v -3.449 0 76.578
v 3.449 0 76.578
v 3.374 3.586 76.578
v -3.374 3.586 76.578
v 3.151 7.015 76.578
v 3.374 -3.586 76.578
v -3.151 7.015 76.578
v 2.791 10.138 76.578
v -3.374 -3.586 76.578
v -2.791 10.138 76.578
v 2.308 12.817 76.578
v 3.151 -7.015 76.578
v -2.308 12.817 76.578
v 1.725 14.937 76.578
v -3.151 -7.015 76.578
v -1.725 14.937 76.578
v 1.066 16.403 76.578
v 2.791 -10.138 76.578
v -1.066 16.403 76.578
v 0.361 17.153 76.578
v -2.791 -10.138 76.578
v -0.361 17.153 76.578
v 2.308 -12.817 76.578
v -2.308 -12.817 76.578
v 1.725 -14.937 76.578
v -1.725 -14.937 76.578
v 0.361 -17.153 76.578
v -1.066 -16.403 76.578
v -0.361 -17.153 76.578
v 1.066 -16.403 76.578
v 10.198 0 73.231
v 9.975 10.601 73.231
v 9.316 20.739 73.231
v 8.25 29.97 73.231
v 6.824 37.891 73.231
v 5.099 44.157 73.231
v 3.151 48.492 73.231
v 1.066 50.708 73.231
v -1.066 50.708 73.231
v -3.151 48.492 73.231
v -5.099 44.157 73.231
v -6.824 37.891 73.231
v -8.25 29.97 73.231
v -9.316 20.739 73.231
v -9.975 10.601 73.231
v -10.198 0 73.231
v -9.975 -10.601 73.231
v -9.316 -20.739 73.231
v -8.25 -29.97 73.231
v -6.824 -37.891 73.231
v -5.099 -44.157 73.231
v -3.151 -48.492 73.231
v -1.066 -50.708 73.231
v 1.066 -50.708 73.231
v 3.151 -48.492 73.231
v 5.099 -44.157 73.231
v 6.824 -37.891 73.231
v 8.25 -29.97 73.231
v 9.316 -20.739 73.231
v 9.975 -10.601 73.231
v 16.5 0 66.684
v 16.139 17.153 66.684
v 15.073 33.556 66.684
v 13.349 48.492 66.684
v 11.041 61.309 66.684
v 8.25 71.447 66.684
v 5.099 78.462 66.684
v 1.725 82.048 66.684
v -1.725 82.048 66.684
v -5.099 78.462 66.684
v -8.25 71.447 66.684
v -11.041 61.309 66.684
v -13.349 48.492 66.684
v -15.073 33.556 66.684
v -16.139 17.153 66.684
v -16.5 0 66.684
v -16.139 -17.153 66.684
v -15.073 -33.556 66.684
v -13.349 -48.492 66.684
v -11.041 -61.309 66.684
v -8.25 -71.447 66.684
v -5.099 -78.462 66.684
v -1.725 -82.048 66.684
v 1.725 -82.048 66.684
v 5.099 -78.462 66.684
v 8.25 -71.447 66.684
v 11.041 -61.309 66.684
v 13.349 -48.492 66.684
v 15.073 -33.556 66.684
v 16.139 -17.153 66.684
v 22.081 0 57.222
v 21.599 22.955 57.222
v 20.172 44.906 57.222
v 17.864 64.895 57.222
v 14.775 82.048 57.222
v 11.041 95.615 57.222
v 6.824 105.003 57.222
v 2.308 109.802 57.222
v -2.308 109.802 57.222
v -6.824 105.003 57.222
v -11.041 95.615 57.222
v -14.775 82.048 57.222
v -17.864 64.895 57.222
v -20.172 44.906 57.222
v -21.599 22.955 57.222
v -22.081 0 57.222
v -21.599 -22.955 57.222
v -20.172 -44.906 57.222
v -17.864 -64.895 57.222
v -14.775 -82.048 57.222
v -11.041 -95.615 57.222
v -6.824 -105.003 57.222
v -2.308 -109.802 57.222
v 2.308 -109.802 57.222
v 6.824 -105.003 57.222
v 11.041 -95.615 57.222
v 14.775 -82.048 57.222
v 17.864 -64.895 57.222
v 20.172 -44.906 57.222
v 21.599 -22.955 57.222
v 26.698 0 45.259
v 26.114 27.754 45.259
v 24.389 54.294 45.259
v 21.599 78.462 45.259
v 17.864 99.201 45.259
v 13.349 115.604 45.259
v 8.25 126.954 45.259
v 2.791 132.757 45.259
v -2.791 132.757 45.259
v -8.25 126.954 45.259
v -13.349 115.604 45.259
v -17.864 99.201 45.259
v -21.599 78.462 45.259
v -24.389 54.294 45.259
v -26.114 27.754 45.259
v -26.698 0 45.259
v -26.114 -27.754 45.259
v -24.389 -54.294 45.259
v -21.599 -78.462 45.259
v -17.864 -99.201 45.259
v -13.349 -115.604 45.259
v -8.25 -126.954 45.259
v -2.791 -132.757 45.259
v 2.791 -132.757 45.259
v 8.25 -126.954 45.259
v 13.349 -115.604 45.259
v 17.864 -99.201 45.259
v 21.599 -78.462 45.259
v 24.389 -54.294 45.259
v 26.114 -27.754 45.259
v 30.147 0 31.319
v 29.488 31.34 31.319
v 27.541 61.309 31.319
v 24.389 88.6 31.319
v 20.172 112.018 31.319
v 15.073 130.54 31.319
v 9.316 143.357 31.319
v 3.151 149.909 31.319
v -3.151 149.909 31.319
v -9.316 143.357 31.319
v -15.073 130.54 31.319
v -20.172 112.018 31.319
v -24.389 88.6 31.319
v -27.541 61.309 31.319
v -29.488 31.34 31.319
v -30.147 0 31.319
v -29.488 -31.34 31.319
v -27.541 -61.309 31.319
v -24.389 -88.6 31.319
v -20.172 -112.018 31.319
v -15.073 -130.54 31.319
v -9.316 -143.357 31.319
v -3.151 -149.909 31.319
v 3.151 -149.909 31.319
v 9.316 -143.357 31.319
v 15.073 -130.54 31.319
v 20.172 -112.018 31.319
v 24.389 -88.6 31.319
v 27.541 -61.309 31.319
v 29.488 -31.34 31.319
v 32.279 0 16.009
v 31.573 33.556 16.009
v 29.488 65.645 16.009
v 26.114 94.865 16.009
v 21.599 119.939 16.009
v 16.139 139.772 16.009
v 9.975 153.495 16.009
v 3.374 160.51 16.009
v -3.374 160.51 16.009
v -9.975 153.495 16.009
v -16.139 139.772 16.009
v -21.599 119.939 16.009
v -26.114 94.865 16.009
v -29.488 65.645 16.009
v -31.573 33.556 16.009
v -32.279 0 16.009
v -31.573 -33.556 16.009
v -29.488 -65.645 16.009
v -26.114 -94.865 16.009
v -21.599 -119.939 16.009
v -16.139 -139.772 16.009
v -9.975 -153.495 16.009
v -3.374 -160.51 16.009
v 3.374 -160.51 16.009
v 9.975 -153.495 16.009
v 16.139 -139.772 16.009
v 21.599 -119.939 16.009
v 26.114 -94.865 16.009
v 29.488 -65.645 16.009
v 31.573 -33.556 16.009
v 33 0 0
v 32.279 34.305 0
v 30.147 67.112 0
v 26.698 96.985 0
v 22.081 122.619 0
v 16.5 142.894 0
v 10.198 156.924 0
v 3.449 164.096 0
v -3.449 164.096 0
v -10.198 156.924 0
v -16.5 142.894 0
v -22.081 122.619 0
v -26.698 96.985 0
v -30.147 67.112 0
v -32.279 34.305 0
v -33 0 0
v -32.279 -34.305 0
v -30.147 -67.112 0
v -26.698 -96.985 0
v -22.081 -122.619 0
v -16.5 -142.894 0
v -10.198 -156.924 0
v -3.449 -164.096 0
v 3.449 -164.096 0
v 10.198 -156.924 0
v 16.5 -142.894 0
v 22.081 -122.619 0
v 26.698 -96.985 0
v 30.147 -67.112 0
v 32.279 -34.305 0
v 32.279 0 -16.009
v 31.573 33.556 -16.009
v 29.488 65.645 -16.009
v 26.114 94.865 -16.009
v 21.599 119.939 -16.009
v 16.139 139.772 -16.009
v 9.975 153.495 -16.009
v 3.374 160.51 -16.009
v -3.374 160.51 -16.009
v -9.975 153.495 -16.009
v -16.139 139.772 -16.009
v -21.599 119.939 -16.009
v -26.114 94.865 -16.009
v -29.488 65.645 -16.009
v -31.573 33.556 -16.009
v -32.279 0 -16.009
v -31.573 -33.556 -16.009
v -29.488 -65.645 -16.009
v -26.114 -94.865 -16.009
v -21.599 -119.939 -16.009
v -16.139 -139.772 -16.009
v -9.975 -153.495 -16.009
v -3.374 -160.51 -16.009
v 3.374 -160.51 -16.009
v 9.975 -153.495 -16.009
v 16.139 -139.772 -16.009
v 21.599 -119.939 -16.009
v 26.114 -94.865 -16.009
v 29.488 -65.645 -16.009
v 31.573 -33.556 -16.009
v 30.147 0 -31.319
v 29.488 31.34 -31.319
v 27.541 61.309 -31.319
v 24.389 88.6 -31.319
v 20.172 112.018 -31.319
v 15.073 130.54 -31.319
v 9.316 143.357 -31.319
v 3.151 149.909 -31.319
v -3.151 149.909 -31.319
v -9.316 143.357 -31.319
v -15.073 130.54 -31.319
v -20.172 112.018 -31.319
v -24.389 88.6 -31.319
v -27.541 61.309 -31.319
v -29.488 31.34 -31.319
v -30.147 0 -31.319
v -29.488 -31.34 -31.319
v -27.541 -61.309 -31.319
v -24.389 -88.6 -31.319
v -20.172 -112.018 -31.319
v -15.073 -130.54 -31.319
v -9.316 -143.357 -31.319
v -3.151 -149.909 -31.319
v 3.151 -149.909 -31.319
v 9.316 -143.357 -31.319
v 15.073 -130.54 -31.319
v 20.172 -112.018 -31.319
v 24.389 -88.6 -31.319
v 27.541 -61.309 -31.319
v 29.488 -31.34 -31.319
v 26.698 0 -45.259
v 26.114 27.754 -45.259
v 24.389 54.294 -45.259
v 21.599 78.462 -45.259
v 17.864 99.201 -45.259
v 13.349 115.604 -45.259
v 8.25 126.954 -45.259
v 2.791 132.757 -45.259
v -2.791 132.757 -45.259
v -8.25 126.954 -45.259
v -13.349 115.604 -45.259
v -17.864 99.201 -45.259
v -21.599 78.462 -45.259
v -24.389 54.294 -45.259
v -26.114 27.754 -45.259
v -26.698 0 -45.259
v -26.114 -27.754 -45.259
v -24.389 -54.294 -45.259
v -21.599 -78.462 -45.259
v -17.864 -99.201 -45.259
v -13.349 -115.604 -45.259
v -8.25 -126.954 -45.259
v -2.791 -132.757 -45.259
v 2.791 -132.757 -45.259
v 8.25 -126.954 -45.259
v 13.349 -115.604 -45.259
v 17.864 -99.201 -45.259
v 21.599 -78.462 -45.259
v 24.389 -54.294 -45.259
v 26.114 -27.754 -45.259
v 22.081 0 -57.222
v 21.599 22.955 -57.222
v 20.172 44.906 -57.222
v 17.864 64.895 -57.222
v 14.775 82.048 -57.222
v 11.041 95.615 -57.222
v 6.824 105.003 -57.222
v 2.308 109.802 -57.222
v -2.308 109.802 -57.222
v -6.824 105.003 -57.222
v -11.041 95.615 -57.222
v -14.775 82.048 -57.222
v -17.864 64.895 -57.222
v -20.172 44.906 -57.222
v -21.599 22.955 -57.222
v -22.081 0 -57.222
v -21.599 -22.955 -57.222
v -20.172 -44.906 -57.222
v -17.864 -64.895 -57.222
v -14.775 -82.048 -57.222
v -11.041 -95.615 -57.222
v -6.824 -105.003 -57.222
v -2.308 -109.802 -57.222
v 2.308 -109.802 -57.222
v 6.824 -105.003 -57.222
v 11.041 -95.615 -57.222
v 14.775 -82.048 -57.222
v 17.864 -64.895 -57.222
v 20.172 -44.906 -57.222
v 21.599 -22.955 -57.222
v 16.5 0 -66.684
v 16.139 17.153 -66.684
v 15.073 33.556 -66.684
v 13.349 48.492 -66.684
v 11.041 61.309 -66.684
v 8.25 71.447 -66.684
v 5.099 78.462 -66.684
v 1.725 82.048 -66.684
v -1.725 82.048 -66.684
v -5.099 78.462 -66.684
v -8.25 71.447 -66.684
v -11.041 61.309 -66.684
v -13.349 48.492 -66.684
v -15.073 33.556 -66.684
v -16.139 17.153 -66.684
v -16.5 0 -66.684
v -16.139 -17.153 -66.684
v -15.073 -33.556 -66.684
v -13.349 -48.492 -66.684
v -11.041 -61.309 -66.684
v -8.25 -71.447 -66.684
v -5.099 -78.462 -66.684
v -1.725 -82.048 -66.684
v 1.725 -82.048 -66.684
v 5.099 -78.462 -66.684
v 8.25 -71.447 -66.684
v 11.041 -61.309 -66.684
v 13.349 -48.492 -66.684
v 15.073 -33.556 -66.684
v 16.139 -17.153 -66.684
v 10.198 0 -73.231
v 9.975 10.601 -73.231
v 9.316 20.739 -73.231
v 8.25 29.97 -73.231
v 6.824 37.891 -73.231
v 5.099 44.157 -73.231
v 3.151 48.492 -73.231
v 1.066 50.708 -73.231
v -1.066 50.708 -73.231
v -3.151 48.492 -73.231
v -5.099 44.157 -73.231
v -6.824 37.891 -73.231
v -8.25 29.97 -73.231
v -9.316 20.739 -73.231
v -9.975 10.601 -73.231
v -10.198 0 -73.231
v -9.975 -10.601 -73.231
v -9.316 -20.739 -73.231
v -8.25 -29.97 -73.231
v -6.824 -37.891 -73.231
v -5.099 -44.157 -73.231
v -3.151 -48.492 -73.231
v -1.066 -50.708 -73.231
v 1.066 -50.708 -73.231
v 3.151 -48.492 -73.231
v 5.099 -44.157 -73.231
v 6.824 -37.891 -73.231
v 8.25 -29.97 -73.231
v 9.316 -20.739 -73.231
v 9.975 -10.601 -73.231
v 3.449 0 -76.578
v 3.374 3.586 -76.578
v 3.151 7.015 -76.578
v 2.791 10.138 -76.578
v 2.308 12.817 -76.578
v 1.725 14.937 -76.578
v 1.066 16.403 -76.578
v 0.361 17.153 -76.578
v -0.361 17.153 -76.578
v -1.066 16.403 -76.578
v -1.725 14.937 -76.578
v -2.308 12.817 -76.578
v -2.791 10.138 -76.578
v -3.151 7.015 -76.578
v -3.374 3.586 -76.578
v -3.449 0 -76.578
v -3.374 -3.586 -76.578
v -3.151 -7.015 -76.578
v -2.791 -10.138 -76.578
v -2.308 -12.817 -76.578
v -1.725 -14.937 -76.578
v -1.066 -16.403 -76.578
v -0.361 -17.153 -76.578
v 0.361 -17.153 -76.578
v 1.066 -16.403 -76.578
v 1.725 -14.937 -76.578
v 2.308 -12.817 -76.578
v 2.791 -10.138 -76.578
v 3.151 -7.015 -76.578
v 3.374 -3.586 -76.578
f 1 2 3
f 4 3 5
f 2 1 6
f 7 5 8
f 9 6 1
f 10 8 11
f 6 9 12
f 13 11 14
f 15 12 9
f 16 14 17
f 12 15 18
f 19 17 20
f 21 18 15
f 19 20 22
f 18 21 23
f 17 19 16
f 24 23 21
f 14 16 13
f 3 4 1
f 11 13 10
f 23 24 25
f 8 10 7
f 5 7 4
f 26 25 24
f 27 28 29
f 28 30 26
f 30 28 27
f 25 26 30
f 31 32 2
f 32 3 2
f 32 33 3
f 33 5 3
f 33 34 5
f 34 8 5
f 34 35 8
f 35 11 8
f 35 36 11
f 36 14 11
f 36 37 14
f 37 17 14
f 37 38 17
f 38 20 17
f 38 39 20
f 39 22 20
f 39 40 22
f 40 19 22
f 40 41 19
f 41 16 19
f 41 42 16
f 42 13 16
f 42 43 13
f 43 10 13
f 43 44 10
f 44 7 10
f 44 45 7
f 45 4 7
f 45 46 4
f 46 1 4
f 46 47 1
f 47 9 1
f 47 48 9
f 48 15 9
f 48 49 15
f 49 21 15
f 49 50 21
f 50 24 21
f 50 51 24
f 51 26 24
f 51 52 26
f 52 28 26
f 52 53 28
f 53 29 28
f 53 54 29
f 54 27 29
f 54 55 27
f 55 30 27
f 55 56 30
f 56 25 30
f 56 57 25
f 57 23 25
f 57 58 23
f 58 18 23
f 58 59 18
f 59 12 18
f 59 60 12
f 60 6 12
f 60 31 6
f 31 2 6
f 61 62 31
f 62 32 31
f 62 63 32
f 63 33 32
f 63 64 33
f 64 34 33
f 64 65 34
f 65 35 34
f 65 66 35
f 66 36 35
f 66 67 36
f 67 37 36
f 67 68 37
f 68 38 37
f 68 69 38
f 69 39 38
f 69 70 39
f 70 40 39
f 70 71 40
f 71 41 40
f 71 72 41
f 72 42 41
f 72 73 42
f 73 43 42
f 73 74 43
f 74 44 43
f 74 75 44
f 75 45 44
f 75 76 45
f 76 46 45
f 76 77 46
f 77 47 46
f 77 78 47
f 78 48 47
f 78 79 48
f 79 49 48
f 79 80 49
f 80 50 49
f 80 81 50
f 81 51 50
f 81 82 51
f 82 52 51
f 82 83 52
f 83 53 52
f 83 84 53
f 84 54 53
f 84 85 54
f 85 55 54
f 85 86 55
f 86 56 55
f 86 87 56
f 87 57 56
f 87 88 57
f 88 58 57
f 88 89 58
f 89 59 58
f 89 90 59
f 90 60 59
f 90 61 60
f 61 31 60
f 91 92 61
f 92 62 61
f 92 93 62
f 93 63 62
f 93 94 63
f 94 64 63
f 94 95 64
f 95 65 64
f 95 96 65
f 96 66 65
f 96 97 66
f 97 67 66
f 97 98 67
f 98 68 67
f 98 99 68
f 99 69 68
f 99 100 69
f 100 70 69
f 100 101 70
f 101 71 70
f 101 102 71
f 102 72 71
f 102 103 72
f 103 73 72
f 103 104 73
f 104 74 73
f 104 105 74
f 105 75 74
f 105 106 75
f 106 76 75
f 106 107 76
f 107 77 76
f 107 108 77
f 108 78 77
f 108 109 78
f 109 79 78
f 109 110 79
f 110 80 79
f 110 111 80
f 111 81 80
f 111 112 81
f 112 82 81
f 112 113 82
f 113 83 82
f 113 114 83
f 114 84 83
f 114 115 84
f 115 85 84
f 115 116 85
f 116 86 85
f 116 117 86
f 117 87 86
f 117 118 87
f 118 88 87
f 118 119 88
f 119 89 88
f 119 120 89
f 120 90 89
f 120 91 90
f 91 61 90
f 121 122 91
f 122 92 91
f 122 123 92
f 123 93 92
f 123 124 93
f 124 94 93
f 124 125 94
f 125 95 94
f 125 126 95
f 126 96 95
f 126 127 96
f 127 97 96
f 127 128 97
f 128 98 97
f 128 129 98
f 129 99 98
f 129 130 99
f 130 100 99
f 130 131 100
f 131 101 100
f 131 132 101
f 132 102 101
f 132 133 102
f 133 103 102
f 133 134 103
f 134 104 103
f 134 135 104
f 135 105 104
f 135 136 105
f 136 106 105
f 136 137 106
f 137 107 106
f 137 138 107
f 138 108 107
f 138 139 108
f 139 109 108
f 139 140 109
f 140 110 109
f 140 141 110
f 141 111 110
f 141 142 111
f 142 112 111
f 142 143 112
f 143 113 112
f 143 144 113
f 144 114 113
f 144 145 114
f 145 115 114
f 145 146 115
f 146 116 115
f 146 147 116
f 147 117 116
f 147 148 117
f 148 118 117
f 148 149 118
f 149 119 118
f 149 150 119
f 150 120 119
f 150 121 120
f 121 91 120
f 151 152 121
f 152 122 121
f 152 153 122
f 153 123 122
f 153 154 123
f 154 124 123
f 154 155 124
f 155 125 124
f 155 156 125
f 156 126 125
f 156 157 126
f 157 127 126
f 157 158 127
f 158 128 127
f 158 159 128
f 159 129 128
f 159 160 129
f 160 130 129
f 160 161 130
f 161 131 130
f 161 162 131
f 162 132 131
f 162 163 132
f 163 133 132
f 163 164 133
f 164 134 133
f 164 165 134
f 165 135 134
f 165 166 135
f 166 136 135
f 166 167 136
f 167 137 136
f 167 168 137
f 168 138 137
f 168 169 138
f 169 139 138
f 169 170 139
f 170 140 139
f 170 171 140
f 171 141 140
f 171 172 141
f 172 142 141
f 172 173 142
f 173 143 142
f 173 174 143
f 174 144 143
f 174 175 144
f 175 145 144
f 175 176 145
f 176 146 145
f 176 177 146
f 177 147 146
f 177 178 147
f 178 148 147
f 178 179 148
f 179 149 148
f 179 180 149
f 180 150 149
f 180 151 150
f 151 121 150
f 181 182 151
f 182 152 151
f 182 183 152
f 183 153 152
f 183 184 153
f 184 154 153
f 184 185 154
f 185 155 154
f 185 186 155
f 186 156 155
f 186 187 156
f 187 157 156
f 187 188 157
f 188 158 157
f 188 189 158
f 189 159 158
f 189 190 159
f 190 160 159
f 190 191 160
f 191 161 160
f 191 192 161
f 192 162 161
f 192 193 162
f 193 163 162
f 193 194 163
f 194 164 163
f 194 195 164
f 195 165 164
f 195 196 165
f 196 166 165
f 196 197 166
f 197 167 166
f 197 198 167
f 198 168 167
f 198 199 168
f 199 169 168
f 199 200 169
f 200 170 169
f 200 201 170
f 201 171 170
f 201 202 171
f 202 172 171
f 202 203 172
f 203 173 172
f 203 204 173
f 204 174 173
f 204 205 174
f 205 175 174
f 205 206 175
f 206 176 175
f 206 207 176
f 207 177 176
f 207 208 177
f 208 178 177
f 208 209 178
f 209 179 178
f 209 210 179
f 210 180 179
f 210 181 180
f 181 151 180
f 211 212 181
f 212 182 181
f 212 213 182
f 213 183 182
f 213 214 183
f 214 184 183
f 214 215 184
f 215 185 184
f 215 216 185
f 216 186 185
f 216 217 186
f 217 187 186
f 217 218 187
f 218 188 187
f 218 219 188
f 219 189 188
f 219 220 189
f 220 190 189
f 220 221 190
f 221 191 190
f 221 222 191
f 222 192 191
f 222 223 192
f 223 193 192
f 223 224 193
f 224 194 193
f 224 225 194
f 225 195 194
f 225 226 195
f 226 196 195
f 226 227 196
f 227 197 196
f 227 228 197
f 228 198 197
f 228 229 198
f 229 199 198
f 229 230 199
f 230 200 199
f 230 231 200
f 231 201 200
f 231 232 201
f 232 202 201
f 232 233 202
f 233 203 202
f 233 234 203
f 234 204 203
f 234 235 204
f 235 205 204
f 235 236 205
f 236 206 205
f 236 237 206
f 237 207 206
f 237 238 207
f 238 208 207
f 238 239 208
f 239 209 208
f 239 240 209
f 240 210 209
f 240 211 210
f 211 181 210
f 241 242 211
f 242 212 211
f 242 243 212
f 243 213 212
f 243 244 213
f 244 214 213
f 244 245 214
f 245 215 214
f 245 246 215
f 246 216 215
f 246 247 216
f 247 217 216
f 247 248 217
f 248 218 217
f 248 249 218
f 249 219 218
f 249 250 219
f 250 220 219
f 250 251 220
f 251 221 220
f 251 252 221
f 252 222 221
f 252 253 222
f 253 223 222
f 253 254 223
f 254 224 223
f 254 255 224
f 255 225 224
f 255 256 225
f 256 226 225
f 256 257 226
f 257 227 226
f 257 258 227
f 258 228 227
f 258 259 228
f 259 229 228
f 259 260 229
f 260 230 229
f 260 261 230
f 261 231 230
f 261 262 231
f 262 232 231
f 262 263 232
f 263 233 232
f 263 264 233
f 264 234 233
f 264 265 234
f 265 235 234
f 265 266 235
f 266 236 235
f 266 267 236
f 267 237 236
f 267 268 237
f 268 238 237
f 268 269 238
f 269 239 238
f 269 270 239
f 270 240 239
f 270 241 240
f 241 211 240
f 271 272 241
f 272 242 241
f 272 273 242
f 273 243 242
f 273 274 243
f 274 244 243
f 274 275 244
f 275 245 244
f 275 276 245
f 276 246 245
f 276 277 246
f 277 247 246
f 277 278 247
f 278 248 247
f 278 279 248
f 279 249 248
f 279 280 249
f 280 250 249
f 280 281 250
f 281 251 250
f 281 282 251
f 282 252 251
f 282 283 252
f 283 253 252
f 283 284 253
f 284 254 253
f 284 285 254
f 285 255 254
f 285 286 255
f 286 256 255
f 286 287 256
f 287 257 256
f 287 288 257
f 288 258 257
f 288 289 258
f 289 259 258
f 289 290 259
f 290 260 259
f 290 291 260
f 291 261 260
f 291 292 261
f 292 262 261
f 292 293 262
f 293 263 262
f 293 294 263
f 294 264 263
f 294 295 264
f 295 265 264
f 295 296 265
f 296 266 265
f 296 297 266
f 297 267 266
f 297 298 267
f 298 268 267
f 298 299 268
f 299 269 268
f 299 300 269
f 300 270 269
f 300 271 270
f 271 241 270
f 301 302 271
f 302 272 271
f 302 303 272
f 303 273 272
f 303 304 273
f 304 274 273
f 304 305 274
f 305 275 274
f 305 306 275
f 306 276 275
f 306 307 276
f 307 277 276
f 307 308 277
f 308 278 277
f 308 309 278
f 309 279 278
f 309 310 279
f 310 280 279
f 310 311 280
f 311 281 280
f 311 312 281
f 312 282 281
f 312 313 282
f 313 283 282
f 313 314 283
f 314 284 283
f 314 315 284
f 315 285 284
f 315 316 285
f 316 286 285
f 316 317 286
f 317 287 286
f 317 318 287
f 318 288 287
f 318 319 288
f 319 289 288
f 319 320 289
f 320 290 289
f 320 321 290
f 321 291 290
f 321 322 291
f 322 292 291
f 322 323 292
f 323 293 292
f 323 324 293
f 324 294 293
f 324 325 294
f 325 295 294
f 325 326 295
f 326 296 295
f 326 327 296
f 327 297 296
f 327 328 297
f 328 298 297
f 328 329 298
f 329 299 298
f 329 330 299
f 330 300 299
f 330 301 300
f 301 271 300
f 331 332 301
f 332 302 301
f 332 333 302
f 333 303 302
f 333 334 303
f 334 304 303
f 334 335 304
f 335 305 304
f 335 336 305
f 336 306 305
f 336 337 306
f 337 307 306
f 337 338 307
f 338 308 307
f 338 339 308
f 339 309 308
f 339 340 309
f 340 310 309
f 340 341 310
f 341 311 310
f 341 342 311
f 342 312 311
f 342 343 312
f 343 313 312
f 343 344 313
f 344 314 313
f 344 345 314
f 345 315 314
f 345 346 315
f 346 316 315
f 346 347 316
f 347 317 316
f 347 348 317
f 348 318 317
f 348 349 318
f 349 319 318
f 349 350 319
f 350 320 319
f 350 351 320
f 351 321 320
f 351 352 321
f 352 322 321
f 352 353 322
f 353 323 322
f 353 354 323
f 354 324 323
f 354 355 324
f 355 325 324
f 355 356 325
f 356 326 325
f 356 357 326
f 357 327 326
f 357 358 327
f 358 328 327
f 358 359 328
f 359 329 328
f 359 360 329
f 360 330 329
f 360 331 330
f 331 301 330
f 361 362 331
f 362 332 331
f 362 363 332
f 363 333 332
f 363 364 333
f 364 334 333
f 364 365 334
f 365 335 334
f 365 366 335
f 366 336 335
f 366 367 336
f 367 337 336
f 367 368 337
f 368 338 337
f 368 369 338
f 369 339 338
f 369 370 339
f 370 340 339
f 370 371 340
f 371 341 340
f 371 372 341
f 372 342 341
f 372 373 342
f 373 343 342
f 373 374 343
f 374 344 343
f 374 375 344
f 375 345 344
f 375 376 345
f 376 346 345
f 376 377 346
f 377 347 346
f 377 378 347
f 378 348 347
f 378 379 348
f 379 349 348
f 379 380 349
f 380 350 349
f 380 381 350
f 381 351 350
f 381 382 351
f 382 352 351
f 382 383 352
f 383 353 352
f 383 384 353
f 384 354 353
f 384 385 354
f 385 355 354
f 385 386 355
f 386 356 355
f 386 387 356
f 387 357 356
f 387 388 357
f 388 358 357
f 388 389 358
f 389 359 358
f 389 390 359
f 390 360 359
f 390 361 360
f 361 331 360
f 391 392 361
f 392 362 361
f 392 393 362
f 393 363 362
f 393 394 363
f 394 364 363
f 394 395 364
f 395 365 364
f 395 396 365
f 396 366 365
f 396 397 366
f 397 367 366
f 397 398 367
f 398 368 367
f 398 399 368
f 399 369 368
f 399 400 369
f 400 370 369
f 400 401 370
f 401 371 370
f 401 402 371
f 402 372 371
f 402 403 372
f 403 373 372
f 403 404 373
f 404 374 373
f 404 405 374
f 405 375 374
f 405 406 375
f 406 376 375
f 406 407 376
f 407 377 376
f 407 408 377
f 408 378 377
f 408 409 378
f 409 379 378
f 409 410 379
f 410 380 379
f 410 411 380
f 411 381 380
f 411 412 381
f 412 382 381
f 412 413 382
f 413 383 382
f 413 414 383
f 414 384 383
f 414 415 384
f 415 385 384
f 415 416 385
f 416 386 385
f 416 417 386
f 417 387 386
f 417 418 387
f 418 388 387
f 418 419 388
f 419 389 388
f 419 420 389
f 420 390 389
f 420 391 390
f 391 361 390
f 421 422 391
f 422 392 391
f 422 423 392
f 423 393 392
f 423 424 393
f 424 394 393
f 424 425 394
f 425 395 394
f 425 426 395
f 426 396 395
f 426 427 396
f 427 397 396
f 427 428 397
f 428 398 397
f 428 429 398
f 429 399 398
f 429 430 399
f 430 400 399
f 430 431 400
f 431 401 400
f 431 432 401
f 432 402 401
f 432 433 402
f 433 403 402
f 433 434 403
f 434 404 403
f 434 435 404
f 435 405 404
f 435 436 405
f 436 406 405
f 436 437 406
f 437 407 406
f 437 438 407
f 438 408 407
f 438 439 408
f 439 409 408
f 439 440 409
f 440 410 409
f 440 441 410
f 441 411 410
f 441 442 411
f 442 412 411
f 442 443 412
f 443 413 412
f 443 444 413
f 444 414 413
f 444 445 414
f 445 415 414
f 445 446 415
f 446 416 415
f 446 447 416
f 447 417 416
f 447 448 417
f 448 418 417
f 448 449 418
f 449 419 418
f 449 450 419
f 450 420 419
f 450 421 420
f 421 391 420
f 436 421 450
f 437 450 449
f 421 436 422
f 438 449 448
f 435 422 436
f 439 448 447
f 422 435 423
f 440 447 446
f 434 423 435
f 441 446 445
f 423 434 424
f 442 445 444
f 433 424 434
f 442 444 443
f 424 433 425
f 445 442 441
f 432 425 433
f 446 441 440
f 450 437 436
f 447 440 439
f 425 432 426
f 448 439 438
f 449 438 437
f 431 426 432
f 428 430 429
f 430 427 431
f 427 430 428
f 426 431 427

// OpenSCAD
// Generated by SolidPython 1.0.1 on 2020-07-29 00:46:45


scale(v = [3, 15, 7]) {
	sphere(r = 11);
}
/***********************************************
*********      SolidPython code:      **********
************************************************
 
# import packages: SolidPython
from solid import *
from solid.utils import *
from itertools import chain, combinations, permutations


class Resize:

    def __init__(self, scad_file):
        self.scad_file = scad_file
        #self.scad_file = import_scad(scad_file)
        # cone/cylinder param:
        self.r1 = 0
        self.r2 = 0
        self.h = 0
        # rectangular prism param:
        self.w = 0
        self.l = 0
        # ellipse param:
        self.r = 0

    # import OpenScad code (file name corresponds to shape)


    # classify shape + parameters
    def assign(self, param1, param2, param3):
        if self.scad_file == 'cone.scad':
            self.r1 = param1
            self.r2 = param2
            self.h = param3
        elif self.scad_file == 'cylinder.scad':
            self.r1 = param1
            self.r2 = param2
            self.h = param3
        elif self.scad_file == 'rectangularPrism.scad':
            self.h = param1
            self.l = param2
            self.w = param3
        else:
            self.r = param1
            self.h = param2

    # resize parameters
    def iterate(self):
        x = range(3, 20, 2)
        i = 1
        if self.scad_file == 'cone.scad':
            tempList = list(permutations(x, 2))
            for temp in tempList:
                param1 = temp[0]
                param2 = temp[1]
                filepath = 'produced_scad_files/' + 'cone' + str(param1) + '_' + str(param2) + '_' + '.scad'
                scad_render_to_file(cylinder(h=param1, r1=param2, r2=0), filepath)

        elif self.scad_file == 'cylinder.scad':
            tempList = list(permutations(x, 3))
            for temp in tempList:
                param1 = temp[0]
                param2 = temp[1]
                filepath = 'produced_scad_files/' + 'cylinder' + str(param1) + '_' + str(param2) + '_' + '.scad'
                scad_render_to_file(cylinder(h=param1, r1=param2, r2=param2), filepath)

        elif self.scad_file == 'rectangularPrism.scad':
            tempList = list(permutations(x, 3))
            for temp in tempList:
                param1 = temp[0]
                param2 = temp[1]
                param3 = temp[2]
                filepath = 'produced_scad_files/' + 'rectangularPrism' + str(param1) + '_' + str(param2) + '_' + str(
                    param3) + '.scad'
                scad_render_to_file(cube(size=(param1, param2, param3)), filepath)

        elif self.scad_file == 'ellipse.scad':
            tempList = list(permutations(x, 4))
            for temp in tempList:
                param1 = temp[0]
                param2 = temp[1]
                param3 = temp[2]
                param4 = temp[3]
                filepath = 'produced_scad_files/' + 'ellipse' + str(param1) + '_' + str(param2) + '_' + str(param3) + '_' + str(param4) + '.scad'
                scad_render_to_file(scale([param1, param2, param3])(sphere(r=param4)), filepath)

    def render_to_scadfile(self):
        scad_render_to_file(scad, 'example.scad') 
 
************************************************/
